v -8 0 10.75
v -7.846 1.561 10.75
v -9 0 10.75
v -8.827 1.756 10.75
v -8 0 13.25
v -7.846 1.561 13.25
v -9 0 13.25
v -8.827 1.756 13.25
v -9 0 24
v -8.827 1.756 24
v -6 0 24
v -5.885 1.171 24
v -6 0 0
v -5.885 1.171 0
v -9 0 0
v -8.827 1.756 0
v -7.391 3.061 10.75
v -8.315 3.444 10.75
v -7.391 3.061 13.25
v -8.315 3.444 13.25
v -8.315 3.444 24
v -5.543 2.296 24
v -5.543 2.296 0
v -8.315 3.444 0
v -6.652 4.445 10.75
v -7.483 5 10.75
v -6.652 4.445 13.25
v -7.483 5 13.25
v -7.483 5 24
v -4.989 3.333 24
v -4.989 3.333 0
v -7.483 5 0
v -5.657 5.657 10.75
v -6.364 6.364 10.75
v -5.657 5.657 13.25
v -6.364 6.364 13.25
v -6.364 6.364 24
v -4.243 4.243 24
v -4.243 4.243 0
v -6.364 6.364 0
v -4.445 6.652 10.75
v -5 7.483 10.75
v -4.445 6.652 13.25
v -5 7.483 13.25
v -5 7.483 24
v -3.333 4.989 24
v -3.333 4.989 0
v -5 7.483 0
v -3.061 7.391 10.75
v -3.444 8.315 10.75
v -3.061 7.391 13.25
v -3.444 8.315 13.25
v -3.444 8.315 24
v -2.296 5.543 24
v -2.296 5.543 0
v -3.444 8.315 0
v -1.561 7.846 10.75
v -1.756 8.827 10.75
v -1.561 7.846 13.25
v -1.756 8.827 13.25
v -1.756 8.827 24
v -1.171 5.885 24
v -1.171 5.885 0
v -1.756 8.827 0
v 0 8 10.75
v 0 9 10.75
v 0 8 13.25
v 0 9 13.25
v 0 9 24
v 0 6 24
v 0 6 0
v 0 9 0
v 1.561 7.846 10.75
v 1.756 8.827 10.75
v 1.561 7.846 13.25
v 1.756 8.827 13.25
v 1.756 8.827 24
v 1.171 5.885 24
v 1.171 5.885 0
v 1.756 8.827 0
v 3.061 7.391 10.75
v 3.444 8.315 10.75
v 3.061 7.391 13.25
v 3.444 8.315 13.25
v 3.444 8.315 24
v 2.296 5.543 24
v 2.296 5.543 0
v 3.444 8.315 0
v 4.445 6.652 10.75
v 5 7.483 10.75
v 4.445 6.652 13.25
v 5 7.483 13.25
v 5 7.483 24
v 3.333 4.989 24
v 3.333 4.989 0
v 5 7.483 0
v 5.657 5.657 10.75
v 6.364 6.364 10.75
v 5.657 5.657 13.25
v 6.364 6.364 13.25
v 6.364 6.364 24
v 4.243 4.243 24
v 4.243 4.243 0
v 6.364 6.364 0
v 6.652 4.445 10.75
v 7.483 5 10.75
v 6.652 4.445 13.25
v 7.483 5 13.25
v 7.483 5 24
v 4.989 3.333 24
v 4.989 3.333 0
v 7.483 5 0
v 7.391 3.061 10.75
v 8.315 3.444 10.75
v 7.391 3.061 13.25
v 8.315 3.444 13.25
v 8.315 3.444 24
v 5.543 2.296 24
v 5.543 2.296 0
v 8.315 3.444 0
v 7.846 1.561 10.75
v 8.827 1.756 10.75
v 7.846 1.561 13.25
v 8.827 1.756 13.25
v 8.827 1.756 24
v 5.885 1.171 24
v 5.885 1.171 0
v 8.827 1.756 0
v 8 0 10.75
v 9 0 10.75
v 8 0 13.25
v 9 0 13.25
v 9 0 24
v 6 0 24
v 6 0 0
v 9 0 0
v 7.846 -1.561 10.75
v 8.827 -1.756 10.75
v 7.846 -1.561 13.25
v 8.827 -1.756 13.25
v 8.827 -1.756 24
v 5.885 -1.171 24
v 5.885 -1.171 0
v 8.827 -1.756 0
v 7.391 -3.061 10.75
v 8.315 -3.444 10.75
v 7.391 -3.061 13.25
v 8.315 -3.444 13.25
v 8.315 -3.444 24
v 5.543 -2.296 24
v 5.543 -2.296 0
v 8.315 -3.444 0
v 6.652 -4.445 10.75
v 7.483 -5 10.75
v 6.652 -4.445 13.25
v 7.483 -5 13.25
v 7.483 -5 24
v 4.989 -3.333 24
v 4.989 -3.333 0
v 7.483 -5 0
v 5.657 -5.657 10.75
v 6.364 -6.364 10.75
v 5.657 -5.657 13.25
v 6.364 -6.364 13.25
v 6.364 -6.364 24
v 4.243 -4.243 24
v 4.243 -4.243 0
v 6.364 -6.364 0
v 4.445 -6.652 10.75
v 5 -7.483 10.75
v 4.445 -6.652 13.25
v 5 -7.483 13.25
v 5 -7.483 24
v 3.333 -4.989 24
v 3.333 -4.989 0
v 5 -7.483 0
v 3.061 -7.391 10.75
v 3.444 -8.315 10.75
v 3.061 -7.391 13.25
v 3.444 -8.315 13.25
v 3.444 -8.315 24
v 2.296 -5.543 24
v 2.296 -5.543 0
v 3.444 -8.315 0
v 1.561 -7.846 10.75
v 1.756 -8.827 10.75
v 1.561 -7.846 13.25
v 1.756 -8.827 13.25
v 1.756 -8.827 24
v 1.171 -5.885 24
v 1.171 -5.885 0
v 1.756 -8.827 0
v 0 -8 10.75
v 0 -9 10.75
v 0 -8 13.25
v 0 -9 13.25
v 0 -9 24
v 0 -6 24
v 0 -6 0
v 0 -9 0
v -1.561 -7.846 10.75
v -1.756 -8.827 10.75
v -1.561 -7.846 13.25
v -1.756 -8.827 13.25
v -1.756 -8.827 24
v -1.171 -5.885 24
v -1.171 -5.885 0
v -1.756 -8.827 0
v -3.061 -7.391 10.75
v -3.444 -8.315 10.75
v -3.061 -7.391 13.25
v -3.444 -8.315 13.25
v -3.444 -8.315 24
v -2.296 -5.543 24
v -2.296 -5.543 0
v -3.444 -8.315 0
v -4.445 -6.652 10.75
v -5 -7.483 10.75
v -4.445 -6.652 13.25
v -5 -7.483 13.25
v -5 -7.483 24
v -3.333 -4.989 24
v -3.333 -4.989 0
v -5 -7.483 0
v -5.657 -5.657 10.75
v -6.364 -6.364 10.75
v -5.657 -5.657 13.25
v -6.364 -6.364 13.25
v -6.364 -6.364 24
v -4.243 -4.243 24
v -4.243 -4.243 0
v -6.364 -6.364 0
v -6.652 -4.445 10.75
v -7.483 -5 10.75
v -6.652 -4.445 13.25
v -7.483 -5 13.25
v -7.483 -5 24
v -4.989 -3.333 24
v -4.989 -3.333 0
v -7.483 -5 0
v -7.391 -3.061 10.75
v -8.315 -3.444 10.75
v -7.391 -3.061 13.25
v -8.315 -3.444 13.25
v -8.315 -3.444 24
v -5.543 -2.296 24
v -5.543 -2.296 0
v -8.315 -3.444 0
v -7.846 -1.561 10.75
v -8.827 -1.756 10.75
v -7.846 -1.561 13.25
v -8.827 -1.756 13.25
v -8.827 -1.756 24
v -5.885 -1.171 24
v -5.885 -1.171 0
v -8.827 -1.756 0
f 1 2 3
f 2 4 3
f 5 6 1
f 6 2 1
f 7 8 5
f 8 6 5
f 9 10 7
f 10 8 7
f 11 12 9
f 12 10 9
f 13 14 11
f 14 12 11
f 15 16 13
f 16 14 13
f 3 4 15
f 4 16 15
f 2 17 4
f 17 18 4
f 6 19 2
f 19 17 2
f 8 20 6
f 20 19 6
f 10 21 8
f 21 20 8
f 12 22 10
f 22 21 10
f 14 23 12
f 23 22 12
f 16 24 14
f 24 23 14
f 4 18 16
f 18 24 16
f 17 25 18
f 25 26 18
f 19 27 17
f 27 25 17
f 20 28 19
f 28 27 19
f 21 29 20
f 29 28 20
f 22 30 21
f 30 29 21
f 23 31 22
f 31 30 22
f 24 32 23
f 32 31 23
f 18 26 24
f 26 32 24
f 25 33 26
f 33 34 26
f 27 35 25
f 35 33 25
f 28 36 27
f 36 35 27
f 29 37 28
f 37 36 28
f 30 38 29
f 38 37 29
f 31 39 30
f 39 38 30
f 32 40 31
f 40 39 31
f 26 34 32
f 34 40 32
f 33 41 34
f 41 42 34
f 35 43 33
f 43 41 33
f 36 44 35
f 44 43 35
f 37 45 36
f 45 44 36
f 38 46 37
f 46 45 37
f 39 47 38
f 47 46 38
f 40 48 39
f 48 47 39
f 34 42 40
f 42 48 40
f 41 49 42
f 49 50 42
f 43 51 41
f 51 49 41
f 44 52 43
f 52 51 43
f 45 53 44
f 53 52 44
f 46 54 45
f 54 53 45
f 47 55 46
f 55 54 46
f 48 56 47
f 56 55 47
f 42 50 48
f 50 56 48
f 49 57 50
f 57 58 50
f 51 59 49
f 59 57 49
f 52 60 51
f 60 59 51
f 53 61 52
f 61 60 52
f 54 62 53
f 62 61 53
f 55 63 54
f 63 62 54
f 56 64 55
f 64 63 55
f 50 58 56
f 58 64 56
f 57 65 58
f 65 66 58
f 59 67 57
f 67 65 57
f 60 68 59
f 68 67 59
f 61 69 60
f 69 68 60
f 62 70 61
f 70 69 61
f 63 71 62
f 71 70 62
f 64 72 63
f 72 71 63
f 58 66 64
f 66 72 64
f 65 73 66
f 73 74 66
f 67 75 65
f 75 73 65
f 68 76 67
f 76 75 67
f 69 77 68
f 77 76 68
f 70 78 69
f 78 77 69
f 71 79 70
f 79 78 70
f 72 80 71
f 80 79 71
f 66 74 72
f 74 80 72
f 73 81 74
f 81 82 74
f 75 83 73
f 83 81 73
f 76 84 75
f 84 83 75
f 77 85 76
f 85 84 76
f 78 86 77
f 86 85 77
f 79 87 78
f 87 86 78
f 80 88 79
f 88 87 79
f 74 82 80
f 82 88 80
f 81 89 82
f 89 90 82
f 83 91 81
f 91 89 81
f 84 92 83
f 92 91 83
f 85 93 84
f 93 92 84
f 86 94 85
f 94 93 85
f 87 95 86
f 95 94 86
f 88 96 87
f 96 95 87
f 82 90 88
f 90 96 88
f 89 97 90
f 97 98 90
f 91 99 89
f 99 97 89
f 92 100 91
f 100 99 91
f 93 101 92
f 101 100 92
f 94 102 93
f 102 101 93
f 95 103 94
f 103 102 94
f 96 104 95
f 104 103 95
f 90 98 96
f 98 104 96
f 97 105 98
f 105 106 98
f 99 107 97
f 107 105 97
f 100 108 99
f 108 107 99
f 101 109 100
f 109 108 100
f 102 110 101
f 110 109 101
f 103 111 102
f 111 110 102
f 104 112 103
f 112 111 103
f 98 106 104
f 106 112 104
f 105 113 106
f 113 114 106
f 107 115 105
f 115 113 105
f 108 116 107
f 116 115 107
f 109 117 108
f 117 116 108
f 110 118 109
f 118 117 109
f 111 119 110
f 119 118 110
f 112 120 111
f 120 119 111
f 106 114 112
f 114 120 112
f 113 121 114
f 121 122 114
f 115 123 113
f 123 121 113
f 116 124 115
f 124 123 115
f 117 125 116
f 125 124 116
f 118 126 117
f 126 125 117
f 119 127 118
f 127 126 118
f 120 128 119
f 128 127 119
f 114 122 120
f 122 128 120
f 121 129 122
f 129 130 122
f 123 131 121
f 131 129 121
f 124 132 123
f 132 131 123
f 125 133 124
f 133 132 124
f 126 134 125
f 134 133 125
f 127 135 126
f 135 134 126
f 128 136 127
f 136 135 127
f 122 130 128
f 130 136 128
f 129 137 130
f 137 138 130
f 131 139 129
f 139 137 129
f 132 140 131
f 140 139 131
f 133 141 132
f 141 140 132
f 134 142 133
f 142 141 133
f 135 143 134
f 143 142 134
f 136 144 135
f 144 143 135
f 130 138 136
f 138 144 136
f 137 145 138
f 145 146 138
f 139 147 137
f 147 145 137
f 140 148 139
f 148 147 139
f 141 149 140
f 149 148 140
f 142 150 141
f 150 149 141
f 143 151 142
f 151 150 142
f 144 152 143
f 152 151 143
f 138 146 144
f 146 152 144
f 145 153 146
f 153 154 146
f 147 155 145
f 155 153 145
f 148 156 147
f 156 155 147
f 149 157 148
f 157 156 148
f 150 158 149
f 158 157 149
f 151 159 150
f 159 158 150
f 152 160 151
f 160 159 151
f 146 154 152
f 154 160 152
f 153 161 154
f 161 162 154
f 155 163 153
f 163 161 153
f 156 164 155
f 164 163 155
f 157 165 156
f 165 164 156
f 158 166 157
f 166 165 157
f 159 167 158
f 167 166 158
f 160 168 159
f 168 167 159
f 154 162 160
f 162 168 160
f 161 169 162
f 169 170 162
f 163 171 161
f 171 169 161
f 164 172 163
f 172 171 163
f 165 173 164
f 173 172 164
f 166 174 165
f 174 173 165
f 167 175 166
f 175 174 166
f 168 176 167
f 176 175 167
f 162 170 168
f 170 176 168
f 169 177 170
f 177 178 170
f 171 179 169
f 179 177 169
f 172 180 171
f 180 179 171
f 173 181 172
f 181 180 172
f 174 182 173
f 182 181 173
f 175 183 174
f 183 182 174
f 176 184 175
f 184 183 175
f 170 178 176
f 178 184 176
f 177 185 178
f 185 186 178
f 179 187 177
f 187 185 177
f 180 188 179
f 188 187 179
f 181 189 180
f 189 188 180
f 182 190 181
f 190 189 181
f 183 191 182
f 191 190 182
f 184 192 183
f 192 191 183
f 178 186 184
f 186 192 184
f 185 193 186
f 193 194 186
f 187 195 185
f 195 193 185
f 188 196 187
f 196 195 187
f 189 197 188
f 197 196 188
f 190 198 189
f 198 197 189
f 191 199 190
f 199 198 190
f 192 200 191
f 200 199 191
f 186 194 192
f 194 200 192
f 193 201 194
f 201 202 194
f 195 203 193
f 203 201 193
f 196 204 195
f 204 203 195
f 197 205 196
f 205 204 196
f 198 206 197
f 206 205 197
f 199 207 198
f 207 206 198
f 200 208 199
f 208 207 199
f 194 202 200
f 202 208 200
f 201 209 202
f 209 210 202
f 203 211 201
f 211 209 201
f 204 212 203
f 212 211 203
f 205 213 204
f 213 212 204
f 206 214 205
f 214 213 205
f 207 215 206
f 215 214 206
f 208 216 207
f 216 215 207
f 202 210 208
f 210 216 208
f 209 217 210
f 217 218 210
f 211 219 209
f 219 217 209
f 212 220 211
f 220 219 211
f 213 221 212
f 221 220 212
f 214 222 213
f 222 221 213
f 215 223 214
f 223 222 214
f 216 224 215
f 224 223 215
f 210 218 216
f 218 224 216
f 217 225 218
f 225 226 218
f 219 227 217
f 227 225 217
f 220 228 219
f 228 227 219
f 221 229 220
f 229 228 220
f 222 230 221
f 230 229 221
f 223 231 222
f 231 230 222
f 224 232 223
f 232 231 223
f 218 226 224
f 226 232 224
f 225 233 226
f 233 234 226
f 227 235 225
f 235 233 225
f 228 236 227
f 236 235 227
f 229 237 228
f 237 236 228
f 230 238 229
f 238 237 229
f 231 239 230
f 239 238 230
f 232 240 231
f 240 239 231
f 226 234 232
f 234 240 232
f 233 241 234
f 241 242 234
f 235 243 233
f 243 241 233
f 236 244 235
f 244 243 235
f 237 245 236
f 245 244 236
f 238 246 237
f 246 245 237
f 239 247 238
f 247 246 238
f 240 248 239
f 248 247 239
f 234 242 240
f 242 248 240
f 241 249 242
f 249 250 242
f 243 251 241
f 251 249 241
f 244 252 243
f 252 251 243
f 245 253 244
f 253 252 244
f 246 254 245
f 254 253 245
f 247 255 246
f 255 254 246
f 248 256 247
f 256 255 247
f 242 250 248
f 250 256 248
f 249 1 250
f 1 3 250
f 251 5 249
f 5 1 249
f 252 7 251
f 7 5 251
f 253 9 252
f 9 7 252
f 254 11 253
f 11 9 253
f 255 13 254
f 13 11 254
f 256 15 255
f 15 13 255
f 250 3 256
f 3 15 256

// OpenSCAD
$fn = 32;

// ----------------------------------------------------------------------
// Grooved revolve: stepped, bore R6
// ----------------------------------------------------------------------

// --- parameters (mm) ---
bore_r = 6;               // bore radius
outer_r = 9;              // outer radius of the body
total_h = 24;             // overall height, Z
wall = 3;                 // radial wall thickness
groove_w = 2.5;           // groove width
groove_d = 1;             // groove depth
grooves = 1;              // number of outer grooves

bbox_x = 2 * outer_r;  // full diameter
bore_d = 2 * bore_r;  // bore diameter
body_d = 2 * outer_r;  // body diameter
revolve_angle = 360;  // full turn around the Z axis

profile = [[6, 0], [9, 0], [9, 10.75], [8, 10.75], [8, 13.25], [9, 13.25], [9, 24], [6, 24]];  // primary outline, 8 points, counter clockwise

// --- the one profile operation ---
rotate_extrude(angle = revolve_angle) polygon(points = profile);
